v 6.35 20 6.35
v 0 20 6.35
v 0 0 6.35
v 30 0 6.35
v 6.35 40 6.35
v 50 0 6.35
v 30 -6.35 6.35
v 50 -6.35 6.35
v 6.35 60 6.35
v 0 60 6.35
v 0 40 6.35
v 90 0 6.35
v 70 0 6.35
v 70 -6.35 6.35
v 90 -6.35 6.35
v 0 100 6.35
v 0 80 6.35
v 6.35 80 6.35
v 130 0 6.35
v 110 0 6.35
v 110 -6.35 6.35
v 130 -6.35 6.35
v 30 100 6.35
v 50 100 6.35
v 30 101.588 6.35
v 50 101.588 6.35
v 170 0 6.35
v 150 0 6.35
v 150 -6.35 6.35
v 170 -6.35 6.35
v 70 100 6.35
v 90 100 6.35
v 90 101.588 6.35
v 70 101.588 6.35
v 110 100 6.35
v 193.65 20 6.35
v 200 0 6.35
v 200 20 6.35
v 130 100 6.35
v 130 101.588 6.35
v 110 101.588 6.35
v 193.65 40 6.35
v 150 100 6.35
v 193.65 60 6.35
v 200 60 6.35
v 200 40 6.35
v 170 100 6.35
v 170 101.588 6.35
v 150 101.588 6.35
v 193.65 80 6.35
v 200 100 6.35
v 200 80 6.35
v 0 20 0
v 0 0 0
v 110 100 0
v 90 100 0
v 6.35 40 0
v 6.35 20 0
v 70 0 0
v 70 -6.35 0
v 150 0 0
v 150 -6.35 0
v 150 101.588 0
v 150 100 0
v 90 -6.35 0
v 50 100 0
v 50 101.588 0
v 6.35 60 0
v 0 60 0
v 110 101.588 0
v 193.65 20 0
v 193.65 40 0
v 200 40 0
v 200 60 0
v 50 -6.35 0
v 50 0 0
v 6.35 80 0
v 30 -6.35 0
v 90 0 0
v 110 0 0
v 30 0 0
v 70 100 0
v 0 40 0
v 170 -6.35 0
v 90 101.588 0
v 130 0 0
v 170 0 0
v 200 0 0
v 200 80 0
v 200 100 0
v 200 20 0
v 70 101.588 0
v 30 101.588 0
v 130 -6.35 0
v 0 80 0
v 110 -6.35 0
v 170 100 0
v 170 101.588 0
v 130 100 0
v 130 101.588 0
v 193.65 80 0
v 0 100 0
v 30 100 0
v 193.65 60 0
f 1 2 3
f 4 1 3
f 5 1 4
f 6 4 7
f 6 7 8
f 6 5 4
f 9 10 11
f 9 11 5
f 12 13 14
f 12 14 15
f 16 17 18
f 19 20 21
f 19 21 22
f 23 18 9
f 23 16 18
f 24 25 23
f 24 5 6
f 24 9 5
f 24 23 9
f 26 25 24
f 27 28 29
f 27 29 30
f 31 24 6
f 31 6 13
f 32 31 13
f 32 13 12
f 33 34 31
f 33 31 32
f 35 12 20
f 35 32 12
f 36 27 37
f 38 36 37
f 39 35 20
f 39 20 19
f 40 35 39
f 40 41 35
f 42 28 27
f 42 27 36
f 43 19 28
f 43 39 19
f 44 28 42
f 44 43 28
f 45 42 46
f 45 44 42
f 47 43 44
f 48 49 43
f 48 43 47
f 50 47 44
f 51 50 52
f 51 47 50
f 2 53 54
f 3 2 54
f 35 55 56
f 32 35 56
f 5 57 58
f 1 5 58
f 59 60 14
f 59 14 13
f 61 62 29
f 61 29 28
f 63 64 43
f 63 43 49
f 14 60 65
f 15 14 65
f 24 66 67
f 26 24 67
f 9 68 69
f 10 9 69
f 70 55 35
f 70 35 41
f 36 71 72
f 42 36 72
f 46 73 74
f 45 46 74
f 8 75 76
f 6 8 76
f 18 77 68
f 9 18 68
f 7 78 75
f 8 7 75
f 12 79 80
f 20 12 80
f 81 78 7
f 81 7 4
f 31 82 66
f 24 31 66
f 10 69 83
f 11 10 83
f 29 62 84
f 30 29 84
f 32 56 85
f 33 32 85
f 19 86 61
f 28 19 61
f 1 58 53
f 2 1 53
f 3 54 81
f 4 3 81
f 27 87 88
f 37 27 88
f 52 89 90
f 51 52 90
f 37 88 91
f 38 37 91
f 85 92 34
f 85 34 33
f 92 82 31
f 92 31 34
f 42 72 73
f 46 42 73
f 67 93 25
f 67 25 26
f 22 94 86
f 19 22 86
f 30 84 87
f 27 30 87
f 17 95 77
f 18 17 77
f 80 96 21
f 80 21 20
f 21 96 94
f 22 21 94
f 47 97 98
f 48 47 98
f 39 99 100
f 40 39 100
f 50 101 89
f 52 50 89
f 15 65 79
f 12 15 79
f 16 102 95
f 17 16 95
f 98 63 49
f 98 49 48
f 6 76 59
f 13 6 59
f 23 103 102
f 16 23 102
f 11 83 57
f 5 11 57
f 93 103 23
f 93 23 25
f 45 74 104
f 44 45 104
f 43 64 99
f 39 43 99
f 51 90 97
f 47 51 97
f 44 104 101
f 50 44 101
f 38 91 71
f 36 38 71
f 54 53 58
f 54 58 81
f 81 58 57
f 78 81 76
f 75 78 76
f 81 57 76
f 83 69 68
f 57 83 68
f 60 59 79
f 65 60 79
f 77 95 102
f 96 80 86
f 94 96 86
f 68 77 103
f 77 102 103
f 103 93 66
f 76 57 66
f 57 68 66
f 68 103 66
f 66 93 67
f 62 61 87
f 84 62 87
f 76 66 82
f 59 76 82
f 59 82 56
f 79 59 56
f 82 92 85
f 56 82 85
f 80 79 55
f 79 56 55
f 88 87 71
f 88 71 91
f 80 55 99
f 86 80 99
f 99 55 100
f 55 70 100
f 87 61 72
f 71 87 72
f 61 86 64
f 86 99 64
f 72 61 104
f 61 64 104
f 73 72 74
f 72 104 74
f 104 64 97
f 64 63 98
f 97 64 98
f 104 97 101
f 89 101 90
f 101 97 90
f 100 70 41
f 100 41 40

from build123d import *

# Parameters (mm, degrees)
SKETCH1_W           = 20
SKETCH1_H           = 6.35
SKETCH1_H_2         = 1.5875
BOSS_EXTRUDE1_DEPTH = 6.35


with BuildPart() as part:
    # Sketch1 → Boss-Extrude1 (new body)
    with BuildSketch(Plane.XY):
        Polygon((0, 20), (0, 0), (30, 0), (50, 0), (70, 0), (90, 0), (110, 0), (130, 0), (150, 0), (170, 0), (200, 0), (200, 20), (193.65, 20), (193.65, 40), (200, 40), (200, 60), (193.65, 60), (193.65, 80), (200, 80), (200, 100), (170, 100), (150, 100), (130, 100), (110, 100), (90, 100), (70, 100), (50, 100), (30, 100), (0, 100), (0, 80), (6.35, 80), (6.35, 60), (0, 60), (0, 40), (6.35, 40), (6.35, 20), align=None)
        with Locations((40, -3.175)):
            Rectangle(SKETCH1_W, SKETCH1_H)
        with Locations((80, -3.175)):
            Rectangle(SKETCH1_W, SKETCH1_H)
        with Locations((120, -3.175)):
            Rectangle(SKETCH1_W, SKETCH1_H)
        with Locations((160, -3.175)):
            Rectangle(SKETCH1_W, SKETCH1_H)
        with Locations((40, 100.79375)):
            Rectangle(SKETCH1_W, SKETCH1_H_2)
        with Locations((80, 100.79375)):
            Rectangle(SKETCH1_W, SKETCH1_H_2)
        with Locations((120, 100.79375)):
            Rectangle(SKETCH1_W, SKETCH1_H_2)
        with Locations((160, 100.79375)):
            Rectangle(SKETCH1_W, SKETCH1_H_2)
    extrude(amount=BOSS_EXTRUDE1_DEPTH)


solid = part.part
